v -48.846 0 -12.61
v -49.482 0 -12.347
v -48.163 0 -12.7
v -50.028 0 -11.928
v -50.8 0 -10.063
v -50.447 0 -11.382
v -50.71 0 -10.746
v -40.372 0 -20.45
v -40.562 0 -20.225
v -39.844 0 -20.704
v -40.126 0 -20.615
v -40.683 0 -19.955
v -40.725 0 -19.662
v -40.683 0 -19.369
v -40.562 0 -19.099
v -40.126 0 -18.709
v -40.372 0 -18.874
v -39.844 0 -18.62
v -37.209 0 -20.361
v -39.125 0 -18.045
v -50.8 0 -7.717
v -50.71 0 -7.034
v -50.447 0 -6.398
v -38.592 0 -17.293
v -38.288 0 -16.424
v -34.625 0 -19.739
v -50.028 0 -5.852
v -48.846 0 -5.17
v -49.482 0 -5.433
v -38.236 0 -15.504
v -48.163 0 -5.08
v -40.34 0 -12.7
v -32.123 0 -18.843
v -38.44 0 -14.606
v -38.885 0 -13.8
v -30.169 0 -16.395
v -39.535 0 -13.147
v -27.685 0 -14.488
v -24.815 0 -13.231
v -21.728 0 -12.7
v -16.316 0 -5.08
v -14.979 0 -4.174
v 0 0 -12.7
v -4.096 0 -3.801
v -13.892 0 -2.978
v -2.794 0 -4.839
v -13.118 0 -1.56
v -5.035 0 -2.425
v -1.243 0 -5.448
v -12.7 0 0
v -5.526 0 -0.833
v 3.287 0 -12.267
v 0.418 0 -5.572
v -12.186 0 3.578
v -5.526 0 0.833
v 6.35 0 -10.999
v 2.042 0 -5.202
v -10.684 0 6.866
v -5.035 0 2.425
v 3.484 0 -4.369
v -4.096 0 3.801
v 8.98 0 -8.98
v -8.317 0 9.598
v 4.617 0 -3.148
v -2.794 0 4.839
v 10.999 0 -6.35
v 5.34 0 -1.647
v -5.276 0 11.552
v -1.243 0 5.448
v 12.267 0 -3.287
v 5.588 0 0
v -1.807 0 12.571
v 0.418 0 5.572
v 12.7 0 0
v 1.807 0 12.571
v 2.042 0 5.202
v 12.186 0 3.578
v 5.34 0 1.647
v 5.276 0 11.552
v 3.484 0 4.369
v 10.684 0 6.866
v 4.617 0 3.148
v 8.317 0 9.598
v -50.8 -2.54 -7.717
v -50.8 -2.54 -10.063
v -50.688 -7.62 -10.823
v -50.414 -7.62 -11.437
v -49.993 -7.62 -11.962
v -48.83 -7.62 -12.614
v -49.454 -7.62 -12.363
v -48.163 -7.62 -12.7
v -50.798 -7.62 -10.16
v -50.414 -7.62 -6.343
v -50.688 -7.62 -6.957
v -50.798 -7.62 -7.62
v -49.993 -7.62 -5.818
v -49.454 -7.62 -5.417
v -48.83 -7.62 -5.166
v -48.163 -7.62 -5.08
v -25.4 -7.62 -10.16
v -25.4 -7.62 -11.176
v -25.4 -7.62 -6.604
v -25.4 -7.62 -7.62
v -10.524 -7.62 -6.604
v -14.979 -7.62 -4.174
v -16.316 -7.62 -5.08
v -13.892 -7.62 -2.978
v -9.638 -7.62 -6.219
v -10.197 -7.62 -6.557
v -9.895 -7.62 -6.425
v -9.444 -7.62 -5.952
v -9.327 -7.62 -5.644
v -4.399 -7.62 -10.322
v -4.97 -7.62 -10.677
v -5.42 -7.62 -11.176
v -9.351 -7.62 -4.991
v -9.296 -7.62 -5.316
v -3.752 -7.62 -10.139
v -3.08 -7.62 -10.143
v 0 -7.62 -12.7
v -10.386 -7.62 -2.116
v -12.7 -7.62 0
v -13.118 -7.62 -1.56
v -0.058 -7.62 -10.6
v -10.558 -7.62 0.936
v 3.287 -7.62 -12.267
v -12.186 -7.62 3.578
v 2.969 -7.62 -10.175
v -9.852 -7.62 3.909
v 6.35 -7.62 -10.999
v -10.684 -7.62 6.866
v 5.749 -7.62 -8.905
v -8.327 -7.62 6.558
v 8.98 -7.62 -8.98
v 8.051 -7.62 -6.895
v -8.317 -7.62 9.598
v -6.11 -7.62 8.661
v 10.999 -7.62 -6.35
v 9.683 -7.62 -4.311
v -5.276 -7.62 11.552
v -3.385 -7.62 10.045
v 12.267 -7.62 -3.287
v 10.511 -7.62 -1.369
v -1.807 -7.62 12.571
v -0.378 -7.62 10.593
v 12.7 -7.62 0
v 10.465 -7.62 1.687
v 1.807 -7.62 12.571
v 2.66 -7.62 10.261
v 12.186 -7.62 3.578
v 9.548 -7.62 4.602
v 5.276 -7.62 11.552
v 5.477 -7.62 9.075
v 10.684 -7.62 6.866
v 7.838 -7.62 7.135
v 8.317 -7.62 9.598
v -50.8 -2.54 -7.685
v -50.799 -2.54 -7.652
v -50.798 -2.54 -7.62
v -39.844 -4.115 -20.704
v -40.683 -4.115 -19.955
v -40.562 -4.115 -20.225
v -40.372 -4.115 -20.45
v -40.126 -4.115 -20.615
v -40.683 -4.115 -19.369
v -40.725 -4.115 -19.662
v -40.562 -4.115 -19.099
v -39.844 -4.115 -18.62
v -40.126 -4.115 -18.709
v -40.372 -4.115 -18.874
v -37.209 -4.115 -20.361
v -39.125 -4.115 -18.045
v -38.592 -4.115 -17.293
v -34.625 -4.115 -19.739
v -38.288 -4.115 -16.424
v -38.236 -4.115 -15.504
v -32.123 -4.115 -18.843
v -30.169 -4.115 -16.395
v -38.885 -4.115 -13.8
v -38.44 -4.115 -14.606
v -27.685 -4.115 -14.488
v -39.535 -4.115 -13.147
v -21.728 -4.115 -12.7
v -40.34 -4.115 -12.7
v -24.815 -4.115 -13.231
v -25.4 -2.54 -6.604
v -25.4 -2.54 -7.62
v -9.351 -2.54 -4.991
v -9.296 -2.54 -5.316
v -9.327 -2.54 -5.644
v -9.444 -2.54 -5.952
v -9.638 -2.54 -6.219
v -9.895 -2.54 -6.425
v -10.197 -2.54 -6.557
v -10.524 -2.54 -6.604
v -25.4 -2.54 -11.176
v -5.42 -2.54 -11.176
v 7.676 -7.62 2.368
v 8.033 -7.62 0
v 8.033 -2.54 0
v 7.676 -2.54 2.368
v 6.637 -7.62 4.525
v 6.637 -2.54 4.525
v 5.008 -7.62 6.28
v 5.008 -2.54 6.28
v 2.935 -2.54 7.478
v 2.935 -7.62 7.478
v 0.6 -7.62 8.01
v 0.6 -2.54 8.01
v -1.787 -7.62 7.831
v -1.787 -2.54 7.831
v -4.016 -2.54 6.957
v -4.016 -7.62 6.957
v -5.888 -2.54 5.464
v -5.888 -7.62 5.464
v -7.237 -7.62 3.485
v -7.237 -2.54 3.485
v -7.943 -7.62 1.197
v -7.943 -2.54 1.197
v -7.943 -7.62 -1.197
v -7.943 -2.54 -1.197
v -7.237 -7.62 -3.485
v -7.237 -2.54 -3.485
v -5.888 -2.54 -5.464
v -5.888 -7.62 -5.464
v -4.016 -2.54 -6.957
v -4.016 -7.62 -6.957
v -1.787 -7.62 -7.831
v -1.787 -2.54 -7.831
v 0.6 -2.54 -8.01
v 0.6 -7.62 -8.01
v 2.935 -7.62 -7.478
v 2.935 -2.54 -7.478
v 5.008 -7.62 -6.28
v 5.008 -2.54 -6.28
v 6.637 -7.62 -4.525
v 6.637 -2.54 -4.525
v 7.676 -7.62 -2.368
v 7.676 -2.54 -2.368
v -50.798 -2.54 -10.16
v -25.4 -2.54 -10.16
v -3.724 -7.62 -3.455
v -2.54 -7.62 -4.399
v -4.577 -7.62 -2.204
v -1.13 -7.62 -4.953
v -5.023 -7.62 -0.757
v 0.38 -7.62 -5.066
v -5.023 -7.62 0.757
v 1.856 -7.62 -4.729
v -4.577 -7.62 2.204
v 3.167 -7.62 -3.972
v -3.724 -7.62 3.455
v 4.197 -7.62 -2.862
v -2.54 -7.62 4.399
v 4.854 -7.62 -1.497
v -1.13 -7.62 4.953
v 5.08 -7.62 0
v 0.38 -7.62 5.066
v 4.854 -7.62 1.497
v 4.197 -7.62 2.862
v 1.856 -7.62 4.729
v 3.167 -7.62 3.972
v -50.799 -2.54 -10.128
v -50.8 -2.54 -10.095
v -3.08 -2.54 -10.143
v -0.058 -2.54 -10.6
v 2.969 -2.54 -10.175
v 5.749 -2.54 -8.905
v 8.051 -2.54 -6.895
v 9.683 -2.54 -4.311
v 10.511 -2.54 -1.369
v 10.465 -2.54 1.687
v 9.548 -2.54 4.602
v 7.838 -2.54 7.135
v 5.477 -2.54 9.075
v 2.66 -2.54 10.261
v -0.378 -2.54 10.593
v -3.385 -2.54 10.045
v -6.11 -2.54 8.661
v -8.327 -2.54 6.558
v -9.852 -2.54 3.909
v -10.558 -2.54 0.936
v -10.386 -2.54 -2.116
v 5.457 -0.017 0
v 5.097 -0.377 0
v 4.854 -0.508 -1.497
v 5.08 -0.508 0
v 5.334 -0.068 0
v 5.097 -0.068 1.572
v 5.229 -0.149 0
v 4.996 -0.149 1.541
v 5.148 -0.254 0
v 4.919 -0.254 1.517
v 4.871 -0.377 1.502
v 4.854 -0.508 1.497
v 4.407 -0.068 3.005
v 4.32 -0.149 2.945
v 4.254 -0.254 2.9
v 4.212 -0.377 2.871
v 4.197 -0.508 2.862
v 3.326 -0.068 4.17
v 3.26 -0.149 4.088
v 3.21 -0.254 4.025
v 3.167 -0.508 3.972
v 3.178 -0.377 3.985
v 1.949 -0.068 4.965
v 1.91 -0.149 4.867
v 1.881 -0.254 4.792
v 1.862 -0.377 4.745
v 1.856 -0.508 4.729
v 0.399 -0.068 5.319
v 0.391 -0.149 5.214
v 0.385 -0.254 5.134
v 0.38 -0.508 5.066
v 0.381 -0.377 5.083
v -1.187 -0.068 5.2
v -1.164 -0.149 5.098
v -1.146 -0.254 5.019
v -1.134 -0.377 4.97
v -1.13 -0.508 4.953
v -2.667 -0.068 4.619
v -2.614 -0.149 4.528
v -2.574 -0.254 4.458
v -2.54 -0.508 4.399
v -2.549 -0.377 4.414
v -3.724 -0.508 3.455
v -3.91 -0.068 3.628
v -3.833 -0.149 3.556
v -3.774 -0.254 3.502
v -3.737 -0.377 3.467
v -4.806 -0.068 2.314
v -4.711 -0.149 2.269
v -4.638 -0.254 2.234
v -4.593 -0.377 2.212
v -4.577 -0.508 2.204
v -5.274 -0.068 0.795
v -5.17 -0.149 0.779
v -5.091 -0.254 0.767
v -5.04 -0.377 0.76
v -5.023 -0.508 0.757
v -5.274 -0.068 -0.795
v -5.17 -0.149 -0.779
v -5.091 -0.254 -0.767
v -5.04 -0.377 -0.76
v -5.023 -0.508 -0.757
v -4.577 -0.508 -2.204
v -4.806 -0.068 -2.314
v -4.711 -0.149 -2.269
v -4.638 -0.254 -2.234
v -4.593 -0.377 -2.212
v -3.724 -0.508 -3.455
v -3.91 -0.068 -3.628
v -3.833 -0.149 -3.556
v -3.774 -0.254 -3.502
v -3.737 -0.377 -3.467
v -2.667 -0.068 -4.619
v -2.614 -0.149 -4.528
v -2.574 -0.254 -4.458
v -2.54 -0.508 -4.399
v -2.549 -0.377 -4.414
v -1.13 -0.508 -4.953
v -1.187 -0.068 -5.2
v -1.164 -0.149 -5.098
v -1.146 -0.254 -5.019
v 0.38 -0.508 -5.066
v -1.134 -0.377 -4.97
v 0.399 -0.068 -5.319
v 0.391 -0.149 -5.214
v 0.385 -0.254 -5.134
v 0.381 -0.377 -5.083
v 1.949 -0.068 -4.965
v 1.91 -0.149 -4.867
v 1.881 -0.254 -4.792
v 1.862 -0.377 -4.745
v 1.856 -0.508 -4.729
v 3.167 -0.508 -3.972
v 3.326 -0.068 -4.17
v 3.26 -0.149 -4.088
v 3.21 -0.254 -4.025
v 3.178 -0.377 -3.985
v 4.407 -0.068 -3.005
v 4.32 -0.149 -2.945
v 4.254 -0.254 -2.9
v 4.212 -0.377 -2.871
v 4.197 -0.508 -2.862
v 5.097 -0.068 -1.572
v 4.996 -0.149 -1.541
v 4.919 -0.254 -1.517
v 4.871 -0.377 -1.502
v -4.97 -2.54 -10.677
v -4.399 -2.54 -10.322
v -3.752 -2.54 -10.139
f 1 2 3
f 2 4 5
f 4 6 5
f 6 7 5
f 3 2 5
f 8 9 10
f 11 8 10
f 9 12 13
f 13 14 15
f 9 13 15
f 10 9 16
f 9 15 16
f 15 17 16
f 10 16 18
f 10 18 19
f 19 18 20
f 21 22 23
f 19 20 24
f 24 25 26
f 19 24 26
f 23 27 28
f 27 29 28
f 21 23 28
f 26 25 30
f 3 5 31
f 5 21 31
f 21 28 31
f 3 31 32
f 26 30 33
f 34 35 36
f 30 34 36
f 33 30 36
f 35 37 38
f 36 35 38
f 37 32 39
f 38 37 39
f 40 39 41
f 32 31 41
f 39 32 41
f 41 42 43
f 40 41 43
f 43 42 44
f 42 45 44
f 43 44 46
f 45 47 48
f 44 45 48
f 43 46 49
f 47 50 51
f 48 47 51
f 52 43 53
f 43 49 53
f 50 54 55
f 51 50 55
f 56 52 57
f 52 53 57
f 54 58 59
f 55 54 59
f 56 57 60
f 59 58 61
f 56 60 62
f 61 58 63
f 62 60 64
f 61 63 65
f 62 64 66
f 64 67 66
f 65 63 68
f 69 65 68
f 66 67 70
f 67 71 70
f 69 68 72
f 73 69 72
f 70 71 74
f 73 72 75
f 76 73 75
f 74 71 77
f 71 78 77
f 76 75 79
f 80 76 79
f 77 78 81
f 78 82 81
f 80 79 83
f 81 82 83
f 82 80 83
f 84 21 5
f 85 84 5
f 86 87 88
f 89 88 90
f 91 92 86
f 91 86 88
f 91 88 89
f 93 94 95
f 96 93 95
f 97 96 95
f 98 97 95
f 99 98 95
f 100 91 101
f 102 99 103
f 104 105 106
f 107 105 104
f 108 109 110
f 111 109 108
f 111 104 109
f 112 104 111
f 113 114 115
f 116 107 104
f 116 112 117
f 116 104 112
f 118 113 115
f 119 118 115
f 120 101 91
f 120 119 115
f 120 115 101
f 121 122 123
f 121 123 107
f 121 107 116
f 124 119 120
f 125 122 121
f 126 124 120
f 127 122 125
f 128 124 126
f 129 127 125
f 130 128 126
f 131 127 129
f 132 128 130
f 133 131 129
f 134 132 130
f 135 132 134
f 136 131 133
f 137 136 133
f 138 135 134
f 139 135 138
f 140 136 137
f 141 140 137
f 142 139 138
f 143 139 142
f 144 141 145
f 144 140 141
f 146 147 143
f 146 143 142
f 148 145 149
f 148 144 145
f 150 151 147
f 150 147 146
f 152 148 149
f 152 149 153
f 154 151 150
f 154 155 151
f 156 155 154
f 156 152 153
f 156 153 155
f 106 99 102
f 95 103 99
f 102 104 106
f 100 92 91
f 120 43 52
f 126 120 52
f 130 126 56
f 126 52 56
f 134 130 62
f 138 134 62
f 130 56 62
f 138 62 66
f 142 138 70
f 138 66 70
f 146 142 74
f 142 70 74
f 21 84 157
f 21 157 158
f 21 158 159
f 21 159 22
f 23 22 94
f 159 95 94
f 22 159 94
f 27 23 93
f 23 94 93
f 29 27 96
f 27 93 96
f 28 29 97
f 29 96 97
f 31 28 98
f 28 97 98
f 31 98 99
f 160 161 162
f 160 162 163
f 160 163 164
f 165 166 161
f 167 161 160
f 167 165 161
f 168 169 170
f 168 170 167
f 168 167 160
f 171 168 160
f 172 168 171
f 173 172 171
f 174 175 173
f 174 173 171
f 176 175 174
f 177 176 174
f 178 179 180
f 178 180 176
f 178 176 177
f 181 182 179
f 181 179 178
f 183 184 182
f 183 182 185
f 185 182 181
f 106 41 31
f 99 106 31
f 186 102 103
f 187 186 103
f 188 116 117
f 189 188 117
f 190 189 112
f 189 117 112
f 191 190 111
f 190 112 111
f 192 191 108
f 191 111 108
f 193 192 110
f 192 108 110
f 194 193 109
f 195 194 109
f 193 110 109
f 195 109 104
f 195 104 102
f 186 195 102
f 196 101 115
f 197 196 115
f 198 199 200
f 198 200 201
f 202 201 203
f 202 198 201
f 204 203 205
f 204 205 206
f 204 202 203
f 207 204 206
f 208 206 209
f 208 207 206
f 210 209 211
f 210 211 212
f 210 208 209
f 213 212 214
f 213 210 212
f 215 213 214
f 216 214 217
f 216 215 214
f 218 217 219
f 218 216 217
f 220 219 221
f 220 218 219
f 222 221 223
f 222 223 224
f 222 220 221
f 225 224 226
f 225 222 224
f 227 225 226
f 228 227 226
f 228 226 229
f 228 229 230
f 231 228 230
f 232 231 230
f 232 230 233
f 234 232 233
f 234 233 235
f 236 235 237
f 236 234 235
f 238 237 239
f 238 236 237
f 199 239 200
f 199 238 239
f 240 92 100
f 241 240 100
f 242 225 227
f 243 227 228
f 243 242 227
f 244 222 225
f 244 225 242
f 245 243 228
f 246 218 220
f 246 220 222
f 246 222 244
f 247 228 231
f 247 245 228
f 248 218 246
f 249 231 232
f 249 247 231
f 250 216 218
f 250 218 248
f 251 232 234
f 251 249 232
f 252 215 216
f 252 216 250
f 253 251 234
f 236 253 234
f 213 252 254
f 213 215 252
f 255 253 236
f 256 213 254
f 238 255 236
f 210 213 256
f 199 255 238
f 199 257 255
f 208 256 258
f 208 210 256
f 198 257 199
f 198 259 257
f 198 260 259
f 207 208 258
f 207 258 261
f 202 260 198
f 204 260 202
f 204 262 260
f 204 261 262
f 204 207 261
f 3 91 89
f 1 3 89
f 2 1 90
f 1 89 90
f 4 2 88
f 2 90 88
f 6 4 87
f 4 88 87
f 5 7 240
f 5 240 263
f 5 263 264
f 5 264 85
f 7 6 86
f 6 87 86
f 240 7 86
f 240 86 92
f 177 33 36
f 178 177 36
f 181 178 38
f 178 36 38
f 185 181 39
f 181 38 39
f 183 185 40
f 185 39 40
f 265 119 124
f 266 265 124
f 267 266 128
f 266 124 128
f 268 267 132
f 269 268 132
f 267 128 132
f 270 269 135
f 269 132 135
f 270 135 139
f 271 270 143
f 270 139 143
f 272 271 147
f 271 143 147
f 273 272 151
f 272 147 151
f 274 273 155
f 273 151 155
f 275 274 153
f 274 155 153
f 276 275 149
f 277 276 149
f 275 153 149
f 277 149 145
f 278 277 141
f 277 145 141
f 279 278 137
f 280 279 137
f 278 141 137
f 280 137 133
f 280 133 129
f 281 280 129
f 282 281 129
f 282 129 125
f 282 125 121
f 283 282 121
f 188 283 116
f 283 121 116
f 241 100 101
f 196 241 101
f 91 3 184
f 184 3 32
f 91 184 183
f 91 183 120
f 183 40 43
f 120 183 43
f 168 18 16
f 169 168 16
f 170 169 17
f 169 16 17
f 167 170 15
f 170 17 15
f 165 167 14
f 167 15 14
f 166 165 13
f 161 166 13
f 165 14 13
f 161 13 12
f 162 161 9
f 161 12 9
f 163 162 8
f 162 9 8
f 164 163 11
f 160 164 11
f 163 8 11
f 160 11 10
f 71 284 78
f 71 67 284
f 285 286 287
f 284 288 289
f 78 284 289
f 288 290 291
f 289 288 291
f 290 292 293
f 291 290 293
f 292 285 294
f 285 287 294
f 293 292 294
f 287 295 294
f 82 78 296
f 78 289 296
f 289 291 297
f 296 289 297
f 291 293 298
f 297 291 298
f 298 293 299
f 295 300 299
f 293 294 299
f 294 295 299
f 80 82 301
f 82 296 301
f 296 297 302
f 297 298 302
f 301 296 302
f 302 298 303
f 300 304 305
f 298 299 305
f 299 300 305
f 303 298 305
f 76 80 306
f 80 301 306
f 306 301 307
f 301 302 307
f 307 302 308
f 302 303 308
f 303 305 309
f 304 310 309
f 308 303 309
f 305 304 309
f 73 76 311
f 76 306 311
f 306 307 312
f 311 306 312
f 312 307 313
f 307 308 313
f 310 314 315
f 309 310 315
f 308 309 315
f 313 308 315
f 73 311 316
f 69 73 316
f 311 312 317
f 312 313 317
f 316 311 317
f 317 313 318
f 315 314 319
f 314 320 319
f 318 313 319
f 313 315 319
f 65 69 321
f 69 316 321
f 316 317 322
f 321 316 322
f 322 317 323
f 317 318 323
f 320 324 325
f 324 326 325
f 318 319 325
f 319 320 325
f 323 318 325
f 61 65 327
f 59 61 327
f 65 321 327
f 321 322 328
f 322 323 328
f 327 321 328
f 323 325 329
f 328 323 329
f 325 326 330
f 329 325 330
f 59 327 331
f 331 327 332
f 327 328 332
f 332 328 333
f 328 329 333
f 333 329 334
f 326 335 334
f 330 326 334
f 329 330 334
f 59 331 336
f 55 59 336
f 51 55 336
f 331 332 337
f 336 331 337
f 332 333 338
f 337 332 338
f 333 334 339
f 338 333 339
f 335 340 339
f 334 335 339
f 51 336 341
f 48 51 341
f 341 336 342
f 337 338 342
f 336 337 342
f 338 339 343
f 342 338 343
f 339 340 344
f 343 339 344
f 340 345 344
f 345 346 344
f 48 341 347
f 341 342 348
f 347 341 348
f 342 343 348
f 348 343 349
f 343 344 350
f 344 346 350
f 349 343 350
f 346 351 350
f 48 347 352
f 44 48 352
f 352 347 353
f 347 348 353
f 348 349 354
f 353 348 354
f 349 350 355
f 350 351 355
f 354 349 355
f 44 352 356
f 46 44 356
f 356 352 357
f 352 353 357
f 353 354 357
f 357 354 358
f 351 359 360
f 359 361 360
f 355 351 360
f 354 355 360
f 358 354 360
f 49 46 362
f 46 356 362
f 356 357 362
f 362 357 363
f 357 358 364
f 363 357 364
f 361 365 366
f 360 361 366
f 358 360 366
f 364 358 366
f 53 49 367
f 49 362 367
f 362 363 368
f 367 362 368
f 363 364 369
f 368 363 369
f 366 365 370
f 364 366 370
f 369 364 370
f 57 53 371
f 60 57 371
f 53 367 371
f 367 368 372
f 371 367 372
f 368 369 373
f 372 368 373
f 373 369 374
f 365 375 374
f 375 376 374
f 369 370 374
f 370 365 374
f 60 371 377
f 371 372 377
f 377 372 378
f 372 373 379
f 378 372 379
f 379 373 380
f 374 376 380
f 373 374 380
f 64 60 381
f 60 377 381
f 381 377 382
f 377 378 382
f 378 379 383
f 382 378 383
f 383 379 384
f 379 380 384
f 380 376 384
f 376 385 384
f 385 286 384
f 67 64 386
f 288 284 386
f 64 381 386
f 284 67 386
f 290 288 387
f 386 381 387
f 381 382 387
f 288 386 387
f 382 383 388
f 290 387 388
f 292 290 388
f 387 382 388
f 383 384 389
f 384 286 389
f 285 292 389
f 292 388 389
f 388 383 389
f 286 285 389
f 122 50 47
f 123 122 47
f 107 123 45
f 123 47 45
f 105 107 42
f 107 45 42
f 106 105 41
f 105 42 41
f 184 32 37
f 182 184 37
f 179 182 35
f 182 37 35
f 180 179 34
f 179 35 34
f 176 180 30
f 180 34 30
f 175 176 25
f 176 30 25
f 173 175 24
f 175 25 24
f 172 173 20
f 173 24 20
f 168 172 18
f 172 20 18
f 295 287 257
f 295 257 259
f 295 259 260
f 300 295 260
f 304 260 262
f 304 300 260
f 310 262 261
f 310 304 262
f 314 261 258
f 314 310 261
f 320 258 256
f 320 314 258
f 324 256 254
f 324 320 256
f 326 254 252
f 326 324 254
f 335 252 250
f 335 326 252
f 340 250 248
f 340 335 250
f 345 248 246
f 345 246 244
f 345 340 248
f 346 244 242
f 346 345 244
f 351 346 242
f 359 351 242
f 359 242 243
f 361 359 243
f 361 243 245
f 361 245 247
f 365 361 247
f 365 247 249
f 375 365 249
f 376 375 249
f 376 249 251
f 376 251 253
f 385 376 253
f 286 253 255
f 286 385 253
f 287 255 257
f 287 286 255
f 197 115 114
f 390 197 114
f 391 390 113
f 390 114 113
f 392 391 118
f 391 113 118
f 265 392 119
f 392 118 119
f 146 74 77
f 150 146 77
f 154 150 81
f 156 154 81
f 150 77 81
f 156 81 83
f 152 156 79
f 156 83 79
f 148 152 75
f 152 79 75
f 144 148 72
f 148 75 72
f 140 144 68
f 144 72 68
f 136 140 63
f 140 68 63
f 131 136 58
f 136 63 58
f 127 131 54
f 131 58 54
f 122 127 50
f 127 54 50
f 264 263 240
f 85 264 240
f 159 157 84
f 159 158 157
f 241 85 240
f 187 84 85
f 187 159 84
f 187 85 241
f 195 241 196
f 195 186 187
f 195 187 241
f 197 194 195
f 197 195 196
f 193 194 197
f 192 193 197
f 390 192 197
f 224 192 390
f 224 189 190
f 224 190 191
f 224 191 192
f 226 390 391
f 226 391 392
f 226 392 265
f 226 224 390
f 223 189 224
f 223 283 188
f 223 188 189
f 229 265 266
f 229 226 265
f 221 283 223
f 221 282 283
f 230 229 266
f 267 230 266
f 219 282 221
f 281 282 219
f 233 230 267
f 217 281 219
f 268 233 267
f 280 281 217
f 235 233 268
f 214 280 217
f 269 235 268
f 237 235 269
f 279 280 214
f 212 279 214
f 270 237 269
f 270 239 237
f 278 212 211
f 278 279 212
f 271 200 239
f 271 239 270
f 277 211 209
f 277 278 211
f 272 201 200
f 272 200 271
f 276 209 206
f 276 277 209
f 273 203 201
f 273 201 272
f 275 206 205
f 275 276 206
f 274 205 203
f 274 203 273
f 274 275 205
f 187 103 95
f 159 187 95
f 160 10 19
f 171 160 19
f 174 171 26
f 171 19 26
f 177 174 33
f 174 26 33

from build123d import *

# Parameters (mm, degrees)
F0_R     = 5.08
F1_DEPTH = 7.62
F2_R     = 8.032786
F3_DEPTH = 5.08
F4_R     = 2.636804
F5_R     = 0.508
F7_DEPTH = 4.1148


with BuildPart() as f1:
    # F0 (on Front) → F1 (new body)
    with BuildSketch(Plane.XZ):
        with BuildLine():
            ThreePointArc((0, -12.7), (8.980256, -8.980256), (12.7, 0))
            ThreePointArc((12.7, 0), (0, 12.7), (-12.7, 0))
            ThreePointArc((-12.7, 0), (-8.980256, -8.980256), (0, -12.7))
        make_face()
        Circle(F0_R, mode=Mode.SUBTRACT)
        with BuildLine():
            ThreePointArc((0, -12.7), (-8.980256, -8.980256), (-12.7, 0))
            ThreePointArc((-12.7, 0), (-13.8923, -2.978256), (-16.315987, -5.08))
            Line((-16.315987, -5.08), (-50.8, -5.08))
            Line((-50.8, -5.08), (-50.8, -12.7))
            Line((-50.8, -12.7), (0, -12.7))
        make_face()
    extrude(amount=F1_DEPTH)

    # F2 (on face) → F3 (cut)
    with BuildSketch(Plane.XZ.offset(7.62)):
        with BuildLine():
            Line((-25.4, -7.62), (-50.8, -7.62))
            Line((-50.8, -7.62), (-50.8, -10.16))
            Line((-50.8, -10.16), (-25.4, -10.16))
            Line((-25.4, -10.16), (-25.4, -11.176))
            Line((-25.4, -11.176), (-5.420324, -11.176))
            ThreePointArc((-5.420324, -11.176), (-4.39868, -10.322378), (-3.079561, -10.142513))
            ThreePointArc((-3.079561, -10.142513), (6.727909, 8.190818), (-9.351117, -4.991079))
            ThreePointArc((-9.351117, -4.991079), (-9.532285, -6.092003), (-10.523605, -6.604))
            Line((-10.523605, -6.604), (-10.551615, -6.604))
            Line((-10.551615, -6.604), (-25.4, -6.604))
            Line((-25.4, -6.604), (-25.4, -7.62))
        make_face()
        Circle(F2_R, mode=Mode.SUBTRACT)
    extrude(amount=-F3_DEPTH, mode=Mode.SUBTRACT)

    # F4
    f4_edges = [f1.edges().sort_by_distance(p)[0] for p in [
        (-50.8, -3.81, -5.08),
        (-50.8, -3.81, -12.7),
    ]]
    fillet(f4_edges, radius=F4_R)

    # F5
    f5_edges = [f1.edges().sort_by_distance(p)[0] for p in [
        (-5.08, 0, 0),
    ]]
    fillet(f5_edges, radius=F5_R)

    # F6 (on Front) → F7 (join)
    with BuildSketch(Plane.XZ):
        with BuildLine():
            ThreePointArc((-40.439792, -12.663556), (-38.240899, -15.451491), (-39.844185, -18.619642))
            ThreePointArc((-39.844185, -18.619642), (-40.724568, -19.661956), (-39.844185, -20.704271))
            ThreePointArc((-39.844185, -20.704271), (-35.908664, -20.084477), (-32.122858, -18.84345))
            ThreePointArc((-32.122858, -18.84345), (-27.401871, -14.325342), (-21.076703, -12.684218))
            Line((-21.076703, -12.684218), (-40.439792, -12.663556))
        make_face()
    extrude(amount=F7_DEPTH)


solid = f1.part
